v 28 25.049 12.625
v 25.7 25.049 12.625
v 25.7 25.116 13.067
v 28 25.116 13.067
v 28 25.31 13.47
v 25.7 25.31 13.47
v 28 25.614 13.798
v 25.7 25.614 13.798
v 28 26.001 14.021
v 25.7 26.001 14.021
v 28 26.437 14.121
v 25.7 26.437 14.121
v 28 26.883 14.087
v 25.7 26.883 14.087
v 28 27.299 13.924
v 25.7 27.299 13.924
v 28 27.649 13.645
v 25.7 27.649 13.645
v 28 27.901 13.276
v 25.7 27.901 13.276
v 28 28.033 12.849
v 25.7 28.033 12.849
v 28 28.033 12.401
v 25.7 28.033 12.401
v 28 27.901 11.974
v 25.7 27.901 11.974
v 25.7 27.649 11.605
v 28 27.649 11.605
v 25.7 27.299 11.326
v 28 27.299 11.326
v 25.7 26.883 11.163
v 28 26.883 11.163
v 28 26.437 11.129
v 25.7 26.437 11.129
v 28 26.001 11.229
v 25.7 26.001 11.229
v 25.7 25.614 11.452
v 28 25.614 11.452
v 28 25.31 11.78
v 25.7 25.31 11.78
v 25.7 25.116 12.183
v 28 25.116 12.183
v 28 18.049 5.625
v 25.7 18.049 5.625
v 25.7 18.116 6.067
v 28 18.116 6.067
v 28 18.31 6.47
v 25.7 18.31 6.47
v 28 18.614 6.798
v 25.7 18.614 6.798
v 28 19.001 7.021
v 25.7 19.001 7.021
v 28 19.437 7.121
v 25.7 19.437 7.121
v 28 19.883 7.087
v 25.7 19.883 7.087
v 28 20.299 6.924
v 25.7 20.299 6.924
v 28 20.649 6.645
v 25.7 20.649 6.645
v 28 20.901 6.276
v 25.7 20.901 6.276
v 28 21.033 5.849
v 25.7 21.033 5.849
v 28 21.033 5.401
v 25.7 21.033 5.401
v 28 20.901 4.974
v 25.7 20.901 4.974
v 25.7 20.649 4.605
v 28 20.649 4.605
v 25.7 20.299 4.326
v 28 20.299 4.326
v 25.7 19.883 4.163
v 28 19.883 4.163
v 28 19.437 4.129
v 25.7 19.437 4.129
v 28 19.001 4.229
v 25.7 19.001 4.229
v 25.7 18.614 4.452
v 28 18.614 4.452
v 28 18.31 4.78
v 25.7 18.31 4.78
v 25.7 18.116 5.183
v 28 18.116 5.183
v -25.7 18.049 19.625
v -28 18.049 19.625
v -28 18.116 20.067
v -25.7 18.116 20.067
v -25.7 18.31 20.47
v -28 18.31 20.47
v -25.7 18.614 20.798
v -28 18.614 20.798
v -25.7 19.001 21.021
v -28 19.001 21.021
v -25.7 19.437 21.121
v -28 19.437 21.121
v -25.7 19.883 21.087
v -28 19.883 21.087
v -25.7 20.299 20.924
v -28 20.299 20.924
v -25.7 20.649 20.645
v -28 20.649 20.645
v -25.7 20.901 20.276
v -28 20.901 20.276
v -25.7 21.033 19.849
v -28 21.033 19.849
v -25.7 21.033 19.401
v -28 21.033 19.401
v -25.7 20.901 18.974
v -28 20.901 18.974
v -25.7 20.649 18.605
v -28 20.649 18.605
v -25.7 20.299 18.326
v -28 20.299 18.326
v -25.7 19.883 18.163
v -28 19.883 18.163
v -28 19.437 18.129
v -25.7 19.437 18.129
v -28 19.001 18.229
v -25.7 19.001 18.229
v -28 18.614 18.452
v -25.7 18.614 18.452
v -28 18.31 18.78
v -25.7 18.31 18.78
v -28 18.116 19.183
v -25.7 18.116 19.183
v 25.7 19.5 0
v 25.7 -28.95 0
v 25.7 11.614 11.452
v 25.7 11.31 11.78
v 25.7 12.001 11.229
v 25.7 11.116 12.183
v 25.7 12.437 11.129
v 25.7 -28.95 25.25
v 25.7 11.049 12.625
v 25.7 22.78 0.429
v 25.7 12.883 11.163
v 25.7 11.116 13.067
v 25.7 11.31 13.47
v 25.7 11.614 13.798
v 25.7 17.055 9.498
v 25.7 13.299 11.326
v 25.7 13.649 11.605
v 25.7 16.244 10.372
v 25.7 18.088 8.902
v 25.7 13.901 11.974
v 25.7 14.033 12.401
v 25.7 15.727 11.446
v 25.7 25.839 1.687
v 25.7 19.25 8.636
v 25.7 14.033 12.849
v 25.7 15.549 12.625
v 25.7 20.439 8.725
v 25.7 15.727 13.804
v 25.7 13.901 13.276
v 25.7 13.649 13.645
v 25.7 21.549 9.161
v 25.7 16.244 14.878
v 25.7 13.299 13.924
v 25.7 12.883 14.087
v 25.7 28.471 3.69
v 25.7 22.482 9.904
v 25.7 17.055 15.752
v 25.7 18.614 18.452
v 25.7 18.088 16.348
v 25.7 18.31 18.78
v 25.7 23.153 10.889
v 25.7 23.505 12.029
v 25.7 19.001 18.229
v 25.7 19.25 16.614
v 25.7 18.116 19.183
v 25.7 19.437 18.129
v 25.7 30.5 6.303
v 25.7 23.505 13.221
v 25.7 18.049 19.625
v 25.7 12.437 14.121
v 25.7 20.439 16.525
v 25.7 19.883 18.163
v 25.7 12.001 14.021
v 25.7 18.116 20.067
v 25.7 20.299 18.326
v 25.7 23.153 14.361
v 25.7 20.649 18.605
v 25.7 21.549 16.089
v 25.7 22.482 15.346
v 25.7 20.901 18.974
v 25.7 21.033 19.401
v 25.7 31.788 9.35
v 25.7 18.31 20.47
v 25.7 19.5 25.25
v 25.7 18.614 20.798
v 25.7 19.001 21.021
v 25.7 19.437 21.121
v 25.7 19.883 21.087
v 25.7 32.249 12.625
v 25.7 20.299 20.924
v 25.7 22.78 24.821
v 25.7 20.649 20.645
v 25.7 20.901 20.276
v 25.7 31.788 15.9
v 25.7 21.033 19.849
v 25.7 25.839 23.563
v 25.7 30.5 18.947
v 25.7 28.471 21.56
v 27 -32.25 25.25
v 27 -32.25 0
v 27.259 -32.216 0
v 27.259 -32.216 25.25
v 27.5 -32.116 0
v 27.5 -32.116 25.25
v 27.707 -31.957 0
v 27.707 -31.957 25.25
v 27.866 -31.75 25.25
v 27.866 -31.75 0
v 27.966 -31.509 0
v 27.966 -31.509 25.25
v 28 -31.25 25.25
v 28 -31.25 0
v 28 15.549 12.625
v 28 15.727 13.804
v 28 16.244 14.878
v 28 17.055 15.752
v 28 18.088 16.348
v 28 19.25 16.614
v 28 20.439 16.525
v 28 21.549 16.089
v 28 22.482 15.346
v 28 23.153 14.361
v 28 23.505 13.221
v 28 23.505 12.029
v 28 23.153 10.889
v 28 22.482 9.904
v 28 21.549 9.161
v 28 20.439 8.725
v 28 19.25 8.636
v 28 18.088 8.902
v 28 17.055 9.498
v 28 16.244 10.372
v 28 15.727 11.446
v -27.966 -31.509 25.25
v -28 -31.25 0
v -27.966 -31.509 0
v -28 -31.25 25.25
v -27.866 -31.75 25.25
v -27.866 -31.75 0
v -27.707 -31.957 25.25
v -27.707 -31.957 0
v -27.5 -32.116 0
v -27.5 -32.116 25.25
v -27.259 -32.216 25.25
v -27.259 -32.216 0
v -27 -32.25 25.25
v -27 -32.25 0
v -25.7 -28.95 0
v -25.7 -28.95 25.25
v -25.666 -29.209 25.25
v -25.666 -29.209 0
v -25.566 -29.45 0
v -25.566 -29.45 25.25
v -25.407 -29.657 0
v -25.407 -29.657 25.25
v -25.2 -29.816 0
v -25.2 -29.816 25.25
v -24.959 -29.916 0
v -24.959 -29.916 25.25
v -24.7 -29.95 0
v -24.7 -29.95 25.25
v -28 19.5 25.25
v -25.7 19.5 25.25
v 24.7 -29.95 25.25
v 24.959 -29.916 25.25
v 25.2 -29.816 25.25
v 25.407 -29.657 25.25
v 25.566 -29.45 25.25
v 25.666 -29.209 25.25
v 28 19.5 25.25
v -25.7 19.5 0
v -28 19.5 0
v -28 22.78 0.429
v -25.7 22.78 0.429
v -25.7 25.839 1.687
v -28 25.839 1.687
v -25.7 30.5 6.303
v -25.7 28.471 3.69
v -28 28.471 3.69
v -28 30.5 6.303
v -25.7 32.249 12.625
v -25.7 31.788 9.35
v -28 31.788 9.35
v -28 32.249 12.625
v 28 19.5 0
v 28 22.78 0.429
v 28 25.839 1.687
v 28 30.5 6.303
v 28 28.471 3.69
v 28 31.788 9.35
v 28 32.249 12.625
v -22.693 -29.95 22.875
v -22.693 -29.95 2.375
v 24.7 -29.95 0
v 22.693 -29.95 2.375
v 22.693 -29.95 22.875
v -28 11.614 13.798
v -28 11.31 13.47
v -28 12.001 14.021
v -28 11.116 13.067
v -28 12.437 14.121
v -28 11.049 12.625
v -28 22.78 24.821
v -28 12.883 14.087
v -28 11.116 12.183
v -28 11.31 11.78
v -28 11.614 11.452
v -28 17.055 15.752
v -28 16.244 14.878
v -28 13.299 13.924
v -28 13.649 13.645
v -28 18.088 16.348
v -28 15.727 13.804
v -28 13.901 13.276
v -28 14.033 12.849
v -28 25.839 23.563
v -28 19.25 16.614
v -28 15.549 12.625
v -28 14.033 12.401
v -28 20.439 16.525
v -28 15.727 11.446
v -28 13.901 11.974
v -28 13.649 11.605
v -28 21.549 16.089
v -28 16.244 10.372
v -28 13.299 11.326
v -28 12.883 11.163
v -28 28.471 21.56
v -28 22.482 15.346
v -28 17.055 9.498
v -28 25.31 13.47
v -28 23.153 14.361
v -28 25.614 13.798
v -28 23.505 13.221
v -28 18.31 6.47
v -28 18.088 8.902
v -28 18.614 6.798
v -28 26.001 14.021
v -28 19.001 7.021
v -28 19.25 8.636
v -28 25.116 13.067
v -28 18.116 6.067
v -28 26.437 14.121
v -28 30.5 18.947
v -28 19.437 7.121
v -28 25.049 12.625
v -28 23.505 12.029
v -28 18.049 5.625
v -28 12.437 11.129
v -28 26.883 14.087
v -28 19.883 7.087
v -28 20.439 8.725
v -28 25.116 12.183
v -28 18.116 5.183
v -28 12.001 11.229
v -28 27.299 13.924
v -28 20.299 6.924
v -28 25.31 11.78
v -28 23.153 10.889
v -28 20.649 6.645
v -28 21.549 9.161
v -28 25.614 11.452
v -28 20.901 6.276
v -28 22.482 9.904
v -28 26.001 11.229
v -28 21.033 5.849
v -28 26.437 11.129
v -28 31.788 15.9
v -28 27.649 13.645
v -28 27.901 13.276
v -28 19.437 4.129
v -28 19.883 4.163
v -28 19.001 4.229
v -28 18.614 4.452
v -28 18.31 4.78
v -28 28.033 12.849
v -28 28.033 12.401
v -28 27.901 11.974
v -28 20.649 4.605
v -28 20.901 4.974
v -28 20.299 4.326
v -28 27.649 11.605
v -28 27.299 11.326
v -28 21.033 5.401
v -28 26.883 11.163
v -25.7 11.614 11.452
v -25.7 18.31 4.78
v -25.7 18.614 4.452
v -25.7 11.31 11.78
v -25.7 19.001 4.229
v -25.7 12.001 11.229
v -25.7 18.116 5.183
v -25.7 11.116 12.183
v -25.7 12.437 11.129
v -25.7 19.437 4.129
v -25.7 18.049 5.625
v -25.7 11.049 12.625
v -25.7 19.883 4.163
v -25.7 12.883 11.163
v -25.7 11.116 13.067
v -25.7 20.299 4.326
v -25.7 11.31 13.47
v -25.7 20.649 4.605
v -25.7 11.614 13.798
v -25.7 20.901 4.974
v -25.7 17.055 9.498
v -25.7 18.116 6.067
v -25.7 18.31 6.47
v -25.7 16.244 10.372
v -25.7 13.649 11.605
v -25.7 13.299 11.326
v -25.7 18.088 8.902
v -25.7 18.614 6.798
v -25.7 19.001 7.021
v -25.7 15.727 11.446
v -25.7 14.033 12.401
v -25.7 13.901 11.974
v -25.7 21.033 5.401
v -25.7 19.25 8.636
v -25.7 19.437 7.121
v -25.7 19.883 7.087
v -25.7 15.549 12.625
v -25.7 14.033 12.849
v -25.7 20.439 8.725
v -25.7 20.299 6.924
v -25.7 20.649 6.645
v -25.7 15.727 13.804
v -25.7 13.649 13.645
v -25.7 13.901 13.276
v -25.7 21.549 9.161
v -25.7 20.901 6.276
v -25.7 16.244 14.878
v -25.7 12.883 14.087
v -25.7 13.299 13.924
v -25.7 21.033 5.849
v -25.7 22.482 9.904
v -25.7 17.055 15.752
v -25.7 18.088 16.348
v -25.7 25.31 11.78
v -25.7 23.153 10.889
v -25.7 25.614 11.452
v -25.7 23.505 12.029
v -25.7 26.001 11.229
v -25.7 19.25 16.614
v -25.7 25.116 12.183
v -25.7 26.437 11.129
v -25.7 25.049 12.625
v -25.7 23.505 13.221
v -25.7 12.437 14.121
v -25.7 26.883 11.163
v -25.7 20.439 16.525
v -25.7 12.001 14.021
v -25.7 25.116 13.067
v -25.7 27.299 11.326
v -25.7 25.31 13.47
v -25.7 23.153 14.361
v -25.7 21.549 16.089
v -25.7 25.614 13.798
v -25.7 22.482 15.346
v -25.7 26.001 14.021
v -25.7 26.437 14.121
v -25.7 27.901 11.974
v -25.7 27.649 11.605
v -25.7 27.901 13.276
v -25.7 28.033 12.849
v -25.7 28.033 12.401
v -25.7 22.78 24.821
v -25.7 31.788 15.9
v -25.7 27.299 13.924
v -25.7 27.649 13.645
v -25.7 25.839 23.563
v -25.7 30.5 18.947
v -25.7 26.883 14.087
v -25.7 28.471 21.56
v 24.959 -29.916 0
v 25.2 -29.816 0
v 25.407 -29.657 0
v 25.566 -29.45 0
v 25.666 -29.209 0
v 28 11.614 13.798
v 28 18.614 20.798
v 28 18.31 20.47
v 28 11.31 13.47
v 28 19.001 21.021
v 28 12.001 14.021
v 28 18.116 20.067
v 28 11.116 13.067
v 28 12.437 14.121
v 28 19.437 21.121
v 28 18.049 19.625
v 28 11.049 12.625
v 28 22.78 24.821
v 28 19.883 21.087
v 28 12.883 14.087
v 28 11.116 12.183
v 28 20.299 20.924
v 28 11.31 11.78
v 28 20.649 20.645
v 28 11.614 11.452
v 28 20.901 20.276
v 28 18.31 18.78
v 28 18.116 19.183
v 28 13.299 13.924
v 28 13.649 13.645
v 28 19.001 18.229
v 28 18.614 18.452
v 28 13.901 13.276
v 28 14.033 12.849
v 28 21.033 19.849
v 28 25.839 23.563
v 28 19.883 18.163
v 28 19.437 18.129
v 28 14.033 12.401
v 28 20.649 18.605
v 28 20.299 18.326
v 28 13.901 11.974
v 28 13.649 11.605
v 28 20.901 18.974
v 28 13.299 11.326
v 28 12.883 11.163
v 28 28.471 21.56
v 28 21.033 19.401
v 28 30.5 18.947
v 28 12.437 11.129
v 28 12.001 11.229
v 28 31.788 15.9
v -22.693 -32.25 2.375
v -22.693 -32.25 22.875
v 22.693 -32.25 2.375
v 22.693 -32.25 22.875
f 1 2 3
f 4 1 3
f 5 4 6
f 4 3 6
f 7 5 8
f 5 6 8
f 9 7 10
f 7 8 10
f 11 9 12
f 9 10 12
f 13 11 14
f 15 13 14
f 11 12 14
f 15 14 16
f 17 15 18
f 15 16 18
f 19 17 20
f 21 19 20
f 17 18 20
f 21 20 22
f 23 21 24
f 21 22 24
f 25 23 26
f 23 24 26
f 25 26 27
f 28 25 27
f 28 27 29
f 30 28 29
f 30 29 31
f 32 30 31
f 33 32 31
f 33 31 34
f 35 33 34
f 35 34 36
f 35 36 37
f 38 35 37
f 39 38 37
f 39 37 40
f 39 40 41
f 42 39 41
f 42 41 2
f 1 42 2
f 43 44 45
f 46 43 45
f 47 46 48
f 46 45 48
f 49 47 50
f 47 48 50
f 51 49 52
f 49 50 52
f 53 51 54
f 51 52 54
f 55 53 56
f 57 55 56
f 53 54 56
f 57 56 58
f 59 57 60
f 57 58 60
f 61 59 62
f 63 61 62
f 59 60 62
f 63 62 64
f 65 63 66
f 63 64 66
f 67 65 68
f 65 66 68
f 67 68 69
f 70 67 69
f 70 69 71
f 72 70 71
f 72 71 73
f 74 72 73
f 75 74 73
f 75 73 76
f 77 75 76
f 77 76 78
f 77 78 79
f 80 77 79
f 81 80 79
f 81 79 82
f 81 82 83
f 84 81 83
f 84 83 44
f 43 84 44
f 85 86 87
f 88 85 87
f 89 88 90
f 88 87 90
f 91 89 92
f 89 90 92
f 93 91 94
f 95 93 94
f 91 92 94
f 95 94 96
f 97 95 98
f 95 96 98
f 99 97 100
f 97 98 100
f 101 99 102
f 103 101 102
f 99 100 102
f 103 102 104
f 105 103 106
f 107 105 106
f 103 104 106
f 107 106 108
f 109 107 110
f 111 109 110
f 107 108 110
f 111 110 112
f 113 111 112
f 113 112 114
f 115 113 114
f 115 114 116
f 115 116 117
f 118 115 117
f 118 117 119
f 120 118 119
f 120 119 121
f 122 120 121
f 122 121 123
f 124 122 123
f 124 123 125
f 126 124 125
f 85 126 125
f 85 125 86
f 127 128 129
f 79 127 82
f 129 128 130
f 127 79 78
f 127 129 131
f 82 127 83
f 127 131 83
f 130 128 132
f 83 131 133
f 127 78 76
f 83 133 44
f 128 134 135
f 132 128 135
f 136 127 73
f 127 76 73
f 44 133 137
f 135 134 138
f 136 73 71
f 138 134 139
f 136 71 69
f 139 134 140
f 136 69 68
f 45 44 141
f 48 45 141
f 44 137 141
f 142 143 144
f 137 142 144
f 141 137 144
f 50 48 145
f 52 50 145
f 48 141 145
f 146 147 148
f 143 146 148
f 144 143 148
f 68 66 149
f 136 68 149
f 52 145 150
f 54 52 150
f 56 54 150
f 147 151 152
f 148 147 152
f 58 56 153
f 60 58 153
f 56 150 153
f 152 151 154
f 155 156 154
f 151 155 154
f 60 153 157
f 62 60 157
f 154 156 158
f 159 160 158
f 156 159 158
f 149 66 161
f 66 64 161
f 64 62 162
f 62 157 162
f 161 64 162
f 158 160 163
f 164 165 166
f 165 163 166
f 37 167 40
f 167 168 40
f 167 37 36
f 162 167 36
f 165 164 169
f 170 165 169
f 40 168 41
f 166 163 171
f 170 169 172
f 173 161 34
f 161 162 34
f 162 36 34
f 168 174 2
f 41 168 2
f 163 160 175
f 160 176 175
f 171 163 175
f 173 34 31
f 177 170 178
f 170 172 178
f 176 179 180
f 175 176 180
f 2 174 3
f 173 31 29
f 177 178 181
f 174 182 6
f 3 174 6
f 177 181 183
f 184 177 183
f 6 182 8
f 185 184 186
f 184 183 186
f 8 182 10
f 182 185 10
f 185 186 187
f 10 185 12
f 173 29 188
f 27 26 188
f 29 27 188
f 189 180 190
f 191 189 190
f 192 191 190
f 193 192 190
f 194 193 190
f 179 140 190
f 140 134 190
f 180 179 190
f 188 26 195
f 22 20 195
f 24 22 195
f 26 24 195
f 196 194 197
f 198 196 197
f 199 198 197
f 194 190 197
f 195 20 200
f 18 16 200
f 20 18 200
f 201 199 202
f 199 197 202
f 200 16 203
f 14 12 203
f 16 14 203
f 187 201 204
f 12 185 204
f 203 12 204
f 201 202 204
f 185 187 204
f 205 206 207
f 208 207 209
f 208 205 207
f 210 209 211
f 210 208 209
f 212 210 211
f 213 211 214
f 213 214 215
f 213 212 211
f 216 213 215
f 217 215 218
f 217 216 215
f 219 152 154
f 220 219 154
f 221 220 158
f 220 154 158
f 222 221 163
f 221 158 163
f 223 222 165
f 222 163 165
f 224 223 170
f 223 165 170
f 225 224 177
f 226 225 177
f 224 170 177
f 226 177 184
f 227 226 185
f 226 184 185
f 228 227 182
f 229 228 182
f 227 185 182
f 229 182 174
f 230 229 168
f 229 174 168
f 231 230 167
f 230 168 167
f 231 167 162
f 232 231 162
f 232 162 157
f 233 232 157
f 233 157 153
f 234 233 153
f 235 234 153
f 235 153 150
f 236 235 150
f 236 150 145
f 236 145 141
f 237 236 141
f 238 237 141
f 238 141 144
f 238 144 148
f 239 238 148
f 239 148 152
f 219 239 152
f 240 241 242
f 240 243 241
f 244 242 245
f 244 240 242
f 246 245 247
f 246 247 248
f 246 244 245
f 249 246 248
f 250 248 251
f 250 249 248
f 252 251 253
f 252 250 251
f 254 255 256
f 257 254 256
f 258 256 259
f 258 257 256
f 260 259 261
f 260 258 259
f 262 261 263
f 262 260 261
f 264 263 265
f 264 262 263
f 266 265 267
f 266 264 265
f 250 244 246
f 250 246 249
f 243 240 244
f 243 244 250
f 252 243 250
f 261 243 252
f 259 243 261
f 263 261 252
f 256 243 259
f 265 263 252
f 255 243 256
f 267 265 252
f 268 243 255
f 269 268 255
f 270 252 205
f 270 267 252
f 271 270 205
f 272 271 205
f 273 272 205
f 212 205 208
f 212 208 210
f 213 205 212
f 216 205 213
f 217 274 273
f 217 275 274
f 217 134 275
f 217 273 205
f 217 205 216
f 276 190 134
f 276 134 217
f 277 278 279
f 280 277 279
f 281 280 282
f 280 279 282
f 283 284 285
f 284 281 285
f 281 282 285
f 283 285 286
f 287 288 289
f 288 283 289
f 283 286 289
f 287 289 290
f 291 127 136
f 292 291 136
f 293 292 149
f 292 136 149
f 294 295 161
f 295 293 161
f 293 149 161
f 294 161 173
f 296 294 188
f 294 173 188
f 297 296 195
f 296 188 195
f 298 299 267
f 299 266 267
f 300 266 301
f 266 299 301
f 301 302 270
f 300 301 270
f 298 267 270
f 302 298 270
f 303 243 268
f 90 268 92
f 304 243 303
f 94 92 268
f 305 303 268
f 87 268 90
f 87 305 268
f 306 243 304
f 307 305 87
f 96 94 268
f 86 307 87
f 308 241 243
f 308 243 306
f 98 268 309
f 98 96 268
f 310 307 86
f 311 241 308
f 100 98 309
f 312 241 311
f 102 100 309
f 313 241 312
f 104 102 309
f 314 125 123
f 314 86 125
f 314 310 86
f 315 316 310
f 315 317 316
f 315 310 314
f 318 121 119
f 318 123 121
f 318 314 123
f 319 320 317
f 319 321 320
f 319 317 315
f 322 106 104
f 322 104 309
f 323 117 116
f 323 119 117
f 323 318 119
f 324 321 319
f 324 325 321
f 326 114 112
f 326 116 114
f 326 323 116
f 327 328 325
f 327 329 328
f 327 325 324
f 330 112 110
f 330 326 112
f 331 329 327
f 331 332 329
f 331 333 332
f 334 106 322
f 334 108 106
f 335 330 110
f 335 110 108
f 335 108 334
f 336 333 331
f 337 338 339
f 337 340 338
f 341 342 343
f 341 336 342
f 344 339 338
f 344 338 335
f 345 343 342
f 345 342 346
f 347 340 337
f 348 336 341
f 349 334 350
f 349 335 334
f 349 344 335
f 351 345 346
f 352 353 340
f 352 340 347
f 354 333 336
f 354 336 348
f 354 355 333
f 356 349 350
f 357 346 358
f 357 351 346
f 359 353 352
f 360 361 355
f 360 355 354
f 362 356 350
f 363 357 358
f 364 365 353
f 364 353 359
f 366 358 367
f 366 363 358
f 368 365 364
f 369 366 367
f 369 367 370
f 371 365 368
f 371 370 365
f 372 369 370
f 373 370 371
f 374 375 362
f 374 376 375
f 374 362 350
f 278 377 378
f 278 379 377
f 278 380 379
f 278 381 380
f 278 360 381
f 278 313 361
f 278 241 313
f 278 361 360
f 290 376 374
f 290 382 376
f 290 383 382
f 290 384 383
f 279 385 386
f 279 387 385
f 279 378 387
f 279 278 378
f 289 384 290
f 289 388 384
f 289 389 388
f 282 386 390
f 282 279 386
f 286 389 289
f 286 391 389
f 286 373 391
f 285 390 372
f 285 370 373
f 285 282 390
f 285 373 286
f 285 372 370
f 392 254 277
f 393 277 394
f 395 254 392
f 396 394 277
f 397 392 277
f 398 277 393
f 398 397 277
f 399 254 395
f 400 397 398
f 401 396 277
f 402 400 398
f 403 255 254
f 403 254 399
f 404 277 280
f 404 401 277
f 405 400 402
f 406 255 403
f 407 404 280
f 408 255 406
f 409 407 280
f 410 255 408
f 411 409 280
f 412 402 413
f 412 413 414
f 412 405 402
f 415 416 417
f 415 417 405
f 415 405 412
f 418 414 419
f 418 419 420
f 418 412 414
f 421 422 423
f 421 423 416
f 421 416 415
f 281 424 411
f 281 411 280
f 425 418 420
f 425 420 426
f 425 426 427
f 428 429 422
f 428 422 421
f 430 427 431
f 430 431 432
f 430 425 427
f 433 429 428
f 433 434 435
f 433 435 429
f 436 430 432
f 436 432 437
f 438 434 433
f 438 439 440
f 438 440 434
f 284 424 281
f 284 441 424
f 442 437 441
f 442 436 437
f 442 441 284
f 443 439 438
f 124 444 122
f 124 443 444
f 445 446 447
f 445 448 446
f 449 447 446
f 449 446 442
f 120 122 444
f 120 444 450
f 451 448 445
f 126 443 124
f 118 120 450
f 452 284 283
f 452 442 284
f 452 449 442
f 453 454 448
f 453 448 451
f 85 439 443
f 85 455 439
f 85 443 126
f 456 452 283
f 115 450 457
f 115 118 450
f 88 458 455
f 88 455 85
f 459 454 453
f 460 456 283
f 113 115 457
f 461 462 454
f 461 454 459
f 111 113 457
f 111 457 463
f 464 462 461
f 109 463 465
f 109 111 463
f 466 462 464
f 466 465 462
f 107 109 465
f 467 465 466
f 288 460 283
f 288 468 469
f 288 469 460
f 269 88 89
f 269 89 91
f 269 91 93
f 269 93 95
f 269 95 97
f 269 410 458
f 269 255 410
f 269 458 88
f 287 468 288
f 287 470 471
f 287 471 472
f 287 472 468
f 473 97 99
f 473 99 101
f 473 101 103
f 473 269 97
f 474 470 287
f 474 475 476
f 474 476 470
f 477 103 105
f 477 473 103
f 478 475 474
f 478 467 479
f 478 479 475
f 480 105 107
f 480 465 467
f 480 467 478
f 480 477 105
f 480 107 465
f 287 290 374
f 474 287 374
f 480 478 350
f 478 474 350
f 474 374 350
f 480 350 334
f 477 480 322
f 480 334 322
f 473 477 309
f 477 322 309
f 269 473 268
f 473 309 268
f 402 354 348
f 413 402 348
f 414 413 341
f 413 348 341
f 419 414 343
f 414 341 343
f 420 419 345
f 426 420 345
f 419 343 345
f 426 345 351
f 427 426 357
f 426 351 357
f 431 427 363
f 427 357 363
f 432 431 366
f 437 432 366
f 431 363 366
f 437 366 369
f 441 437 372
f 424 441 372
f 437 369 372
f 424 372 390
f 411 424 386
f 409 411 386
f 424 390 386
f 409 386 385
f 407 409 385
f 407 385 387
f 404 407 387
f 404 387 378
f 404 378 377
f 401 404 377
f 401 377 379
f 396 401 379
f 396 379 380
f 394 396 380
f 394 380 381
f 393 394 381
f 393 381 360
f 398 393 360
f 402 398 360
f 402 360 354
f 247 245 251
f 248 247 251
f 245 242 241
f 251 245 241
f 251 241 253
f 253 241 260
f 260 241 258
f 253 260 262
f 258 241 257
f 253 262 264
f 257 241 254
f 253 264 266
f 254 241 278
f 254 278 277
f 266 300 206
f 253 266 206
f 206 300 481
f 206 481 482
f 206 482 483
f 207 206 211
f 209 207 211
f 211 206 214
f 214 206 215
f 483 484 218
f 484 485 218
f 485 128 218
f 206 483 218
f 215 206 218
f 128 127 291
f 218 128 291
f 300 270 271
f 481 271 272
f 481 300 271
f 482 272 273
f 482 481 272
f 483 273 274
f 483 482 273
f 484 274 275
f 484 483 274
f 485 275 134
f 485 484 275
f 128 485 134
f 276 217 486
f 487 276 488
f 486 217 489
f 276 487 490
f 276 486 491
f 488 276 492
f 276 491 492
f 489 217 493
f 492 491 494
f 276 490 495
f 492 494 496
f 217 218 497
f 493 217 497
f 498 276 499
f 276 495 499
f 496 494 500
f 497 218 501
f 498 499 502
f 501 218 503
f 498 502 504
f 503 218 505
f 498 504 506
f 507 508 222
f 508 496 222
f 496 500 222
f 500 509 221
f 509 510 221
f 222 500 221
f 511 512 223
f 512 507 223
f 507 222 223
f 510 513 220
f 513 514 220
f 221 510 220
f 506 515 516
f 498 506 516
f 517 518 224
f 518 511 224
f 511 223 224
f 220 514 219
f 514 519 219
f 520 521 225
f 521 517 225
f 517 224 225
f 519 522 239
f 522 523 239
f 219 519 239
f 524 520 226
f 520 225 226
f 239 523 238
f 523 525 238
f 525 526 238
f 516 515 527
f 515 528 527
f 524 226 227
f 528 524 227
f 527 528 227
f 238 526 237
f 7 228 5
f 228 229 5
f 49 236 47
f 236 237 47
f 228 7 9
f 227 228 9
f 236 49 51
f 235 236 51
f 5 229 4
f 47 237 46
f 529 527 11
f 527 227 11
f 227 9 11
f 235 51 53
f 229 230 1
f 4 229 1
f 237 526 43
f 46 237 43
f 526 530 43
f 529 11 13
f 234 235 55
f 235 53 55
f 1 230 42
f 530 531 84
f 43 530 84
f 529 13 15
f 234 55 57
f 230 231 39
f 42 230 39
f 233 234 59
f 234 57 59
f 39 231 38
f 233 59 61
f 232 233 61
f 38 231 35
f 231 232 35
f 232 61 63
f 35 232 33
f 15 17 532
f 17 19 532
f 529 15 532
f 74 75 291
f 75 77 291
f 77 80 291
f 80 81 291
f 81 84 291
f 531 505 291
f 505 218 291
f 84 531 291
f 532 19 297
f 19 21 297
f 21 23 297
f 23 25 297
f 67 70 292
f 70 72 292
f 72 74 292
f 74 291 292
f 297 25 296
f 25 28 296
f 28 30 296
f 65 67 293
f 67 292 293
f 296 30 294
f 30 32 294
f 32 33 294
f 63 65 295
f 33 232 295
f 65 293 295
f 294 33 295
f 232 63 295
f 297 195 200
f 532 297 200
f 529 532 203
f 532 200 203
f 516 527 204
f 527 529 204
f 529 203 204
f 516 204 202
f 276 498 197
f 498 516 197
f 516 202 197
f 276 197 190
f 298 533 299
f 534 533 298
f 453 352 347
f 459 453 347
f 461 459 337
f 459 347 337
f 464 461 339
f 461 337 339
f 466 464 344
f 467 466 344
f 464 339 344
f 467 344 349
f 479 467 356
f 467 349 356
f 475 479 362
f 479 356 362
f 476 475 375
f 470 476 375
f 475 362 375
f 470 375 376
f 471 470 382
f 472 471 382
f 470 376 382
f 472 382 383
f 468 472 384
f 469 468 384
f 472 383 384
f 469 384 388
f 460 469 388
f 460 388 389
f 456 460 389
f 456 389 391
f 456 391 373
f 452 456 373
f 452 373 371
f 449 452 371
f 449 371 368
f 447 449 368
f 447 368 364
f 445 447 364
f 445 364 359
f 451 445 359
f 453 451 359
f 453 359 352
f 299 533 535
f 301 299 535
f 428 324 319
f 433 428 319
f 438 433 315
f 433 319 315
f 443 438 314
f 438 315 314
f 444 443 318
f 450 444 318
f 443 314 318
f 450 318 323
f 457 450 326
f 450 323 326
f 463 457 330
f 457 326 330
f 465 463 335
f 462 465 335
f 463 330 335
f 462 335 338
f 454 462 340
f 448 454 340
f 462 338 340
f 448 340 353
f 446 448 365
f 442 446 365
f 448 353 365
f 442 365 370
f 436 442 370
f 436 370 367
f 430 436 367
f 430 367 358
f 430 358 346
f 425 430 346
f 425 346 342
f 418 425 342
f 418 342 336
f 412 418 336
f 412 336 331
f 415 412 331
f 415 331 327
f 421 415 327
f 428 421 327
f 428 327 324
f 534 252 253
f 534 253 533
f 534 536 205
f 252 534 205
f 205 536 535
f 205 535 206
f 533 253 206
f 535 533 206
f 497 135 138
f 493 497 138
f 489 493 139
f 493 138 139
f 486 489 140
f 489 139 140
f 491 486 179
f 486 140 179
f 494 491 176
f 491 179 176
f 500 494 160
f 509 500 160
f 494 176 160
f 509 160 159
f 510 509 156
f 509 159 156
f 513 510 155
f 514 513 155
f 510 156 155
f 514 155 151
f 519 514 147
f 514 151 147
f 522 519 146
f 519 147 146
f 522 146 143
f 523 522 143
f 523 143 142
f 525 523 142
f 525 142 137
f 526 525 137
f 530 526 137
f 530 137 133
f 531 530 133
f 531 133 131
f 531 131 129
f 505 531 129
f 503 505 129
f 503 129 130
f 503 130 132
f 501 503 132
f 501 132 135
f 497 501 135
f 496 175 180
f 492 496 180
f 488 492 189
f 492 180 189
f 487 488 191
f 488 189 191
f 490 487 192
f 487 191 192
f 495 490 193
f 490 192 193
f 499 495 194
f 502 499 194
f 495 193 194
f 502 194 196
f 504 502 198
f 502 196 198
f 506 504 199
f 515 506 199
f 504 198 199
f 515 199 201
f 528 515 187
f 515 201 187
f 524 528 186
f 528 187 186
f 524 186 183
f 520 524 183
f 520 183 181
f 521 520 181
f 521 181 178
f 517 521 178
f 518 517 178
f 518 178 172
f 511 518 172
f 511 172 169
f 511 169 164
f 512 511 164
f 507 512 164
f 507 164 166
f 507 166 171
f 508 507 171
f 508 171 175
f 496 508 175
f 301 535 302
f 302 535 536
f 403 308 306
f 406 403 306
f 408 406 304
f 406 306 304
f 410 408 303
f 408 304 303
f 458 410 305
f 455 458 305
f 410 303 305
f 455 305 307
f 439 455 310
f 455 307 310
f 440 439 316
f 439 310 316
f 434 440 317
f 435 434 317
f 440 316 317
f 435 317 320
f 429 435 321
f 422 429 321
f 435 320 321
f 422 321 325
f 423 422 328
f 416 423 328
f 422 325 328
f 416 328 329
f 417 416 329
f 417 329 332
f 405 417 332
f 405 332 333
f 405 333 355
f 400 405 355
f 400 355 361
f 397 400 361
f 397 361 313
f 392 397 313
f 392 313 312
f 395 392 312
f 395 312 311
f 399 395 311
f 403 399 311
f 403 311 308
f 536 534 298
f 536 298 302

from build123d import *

# Parameters (mm, degrees)
SKETCH1_W           = 56
SKETCH1_H           = 64.5
BOSS_EXTRUDE1_DEPTH = 25.25
SKETCH2_W           = 51.4
SKETCH2_H           = 62.2
CUT_EXTRUDE1_DEPTH  = 50.614765947
FILLET1_R           = 1
FILLET3_R           = 12.75
SKETCH4_W           = 45.38697638
SKETCH4_H           = 20.5
CUT_EXTRUDE3_DEPTH  = 75.710999554
SKETCH5_R           = 4
SKETCH5_R_2         = 1.5
CUT_EXTRUDE4_DEPTH  = 70.380292591


with BuildPart() as part:
    # Sketch1 → Boss-Extrude1 (new body)
    with BuildSketch(Plane.XY):
        Rectangle(SKETCH1_W, SKETCH1_H)
    extrude(amount=BOSS_EXTRUDE1_DEPTH)

    # Sketch2 → Cut-Extrude1 (cut, through all)
    with BuildSketch(Plane.XY.offset(25.25)):
        with Locations((0, 1.15)):
            Rectangle(SKETCH2_W, SKETCH2_H)
    extrude(amount=-CUT_EXTRUDE1_DEPTH, mode=Mode.SUBTRACT)

    # Fillet1
    fillet1_edges = [part.edges().sort_by_distance(p)[0] for p in [
        (-25.7, -29.95, 12.625),
        (25.7, -29.95, 12.625),
        (28, -32.25, 12.625),
        (-28, -32.25, 12.625),
    ]]
    fillet(fillet1_edges, radius=FILLET1_R)

    # Fillet3
    # the kernel refuses this fillet: 12.75 mm, written as the material it takes off along each edge
    with BuildSketch(Plane(origin=(-59.875, 32.25, 25.25), x_dir=(0, 0, -1), z_dir=(1, 0, 0)), Plane(origin=(-6.175, 32.25, 25.25), x_dir=(0, 0, -1), z_dir=(1, 0, 0)), Plane(origin=(-59.875, 32.25, 0), x_dir=(0, -1, 0), z_dir=(1, 0, 0)), Plane(origin=(-6.175, 32.25, 0), x_dir=(0, -1, 0), z_dir=(1, 0, 0))) as fillet3_piece_1:
        with BuildLine():
            CenterArc((FILLET3_R, -FILLET3_R), FILLET3_R, 90, 90)
            Line((0, -FILLET3_R), (0, 0))
            Line((0, 0), (FILLET3_R, 0))
        make_face()
    extrude(amount=66.05, mode=Mode.SUBTRACT)

    # Sketch4 → Cut-Extrude3 (cut, through all)
    with BuildSketch(Plane.XZ.offset(32.25)):
        with Locations((0, 12.625)):
            Rectangle(SKETCH4_W, SKETCH4_H)
    extrude(amount=-CUT_EXTRUDE3_DEPTH, mode=Mode.SUBTRACT)

    # Sketch5 → Cut-Extrude4 (cut, through all)
    with BuildSketch(Plane.ZY.offset(28)):
        with Locations(Location((12.625, 19.54938724, 0), (0, 0, 270))):
            Circle(SKETCH5_R)
        with Locations(Location((12.625, 26.54938724, 0), (0, 0, 270))):
            Circle(SKETCH5_R_2)
        with Locations(Location((19.625, 19.54938724, 0), (0, 0, 270))):
            Circle(SKETCH5_R_2)
        with Locations(Location((12.625, 12.54938724, 0), (0, 0, 270))):
            Circle(SKETCH5_R_2)
        with Locations(Location((5.625, 19.54938724, 0), (0, 0, 270))):
            Circle(SKETCH5_R_2)
    extrude(amount=-CUT_EXTRUDE4_DEPTH, mode=Mode.SUBTRACT)


solid = part.part
